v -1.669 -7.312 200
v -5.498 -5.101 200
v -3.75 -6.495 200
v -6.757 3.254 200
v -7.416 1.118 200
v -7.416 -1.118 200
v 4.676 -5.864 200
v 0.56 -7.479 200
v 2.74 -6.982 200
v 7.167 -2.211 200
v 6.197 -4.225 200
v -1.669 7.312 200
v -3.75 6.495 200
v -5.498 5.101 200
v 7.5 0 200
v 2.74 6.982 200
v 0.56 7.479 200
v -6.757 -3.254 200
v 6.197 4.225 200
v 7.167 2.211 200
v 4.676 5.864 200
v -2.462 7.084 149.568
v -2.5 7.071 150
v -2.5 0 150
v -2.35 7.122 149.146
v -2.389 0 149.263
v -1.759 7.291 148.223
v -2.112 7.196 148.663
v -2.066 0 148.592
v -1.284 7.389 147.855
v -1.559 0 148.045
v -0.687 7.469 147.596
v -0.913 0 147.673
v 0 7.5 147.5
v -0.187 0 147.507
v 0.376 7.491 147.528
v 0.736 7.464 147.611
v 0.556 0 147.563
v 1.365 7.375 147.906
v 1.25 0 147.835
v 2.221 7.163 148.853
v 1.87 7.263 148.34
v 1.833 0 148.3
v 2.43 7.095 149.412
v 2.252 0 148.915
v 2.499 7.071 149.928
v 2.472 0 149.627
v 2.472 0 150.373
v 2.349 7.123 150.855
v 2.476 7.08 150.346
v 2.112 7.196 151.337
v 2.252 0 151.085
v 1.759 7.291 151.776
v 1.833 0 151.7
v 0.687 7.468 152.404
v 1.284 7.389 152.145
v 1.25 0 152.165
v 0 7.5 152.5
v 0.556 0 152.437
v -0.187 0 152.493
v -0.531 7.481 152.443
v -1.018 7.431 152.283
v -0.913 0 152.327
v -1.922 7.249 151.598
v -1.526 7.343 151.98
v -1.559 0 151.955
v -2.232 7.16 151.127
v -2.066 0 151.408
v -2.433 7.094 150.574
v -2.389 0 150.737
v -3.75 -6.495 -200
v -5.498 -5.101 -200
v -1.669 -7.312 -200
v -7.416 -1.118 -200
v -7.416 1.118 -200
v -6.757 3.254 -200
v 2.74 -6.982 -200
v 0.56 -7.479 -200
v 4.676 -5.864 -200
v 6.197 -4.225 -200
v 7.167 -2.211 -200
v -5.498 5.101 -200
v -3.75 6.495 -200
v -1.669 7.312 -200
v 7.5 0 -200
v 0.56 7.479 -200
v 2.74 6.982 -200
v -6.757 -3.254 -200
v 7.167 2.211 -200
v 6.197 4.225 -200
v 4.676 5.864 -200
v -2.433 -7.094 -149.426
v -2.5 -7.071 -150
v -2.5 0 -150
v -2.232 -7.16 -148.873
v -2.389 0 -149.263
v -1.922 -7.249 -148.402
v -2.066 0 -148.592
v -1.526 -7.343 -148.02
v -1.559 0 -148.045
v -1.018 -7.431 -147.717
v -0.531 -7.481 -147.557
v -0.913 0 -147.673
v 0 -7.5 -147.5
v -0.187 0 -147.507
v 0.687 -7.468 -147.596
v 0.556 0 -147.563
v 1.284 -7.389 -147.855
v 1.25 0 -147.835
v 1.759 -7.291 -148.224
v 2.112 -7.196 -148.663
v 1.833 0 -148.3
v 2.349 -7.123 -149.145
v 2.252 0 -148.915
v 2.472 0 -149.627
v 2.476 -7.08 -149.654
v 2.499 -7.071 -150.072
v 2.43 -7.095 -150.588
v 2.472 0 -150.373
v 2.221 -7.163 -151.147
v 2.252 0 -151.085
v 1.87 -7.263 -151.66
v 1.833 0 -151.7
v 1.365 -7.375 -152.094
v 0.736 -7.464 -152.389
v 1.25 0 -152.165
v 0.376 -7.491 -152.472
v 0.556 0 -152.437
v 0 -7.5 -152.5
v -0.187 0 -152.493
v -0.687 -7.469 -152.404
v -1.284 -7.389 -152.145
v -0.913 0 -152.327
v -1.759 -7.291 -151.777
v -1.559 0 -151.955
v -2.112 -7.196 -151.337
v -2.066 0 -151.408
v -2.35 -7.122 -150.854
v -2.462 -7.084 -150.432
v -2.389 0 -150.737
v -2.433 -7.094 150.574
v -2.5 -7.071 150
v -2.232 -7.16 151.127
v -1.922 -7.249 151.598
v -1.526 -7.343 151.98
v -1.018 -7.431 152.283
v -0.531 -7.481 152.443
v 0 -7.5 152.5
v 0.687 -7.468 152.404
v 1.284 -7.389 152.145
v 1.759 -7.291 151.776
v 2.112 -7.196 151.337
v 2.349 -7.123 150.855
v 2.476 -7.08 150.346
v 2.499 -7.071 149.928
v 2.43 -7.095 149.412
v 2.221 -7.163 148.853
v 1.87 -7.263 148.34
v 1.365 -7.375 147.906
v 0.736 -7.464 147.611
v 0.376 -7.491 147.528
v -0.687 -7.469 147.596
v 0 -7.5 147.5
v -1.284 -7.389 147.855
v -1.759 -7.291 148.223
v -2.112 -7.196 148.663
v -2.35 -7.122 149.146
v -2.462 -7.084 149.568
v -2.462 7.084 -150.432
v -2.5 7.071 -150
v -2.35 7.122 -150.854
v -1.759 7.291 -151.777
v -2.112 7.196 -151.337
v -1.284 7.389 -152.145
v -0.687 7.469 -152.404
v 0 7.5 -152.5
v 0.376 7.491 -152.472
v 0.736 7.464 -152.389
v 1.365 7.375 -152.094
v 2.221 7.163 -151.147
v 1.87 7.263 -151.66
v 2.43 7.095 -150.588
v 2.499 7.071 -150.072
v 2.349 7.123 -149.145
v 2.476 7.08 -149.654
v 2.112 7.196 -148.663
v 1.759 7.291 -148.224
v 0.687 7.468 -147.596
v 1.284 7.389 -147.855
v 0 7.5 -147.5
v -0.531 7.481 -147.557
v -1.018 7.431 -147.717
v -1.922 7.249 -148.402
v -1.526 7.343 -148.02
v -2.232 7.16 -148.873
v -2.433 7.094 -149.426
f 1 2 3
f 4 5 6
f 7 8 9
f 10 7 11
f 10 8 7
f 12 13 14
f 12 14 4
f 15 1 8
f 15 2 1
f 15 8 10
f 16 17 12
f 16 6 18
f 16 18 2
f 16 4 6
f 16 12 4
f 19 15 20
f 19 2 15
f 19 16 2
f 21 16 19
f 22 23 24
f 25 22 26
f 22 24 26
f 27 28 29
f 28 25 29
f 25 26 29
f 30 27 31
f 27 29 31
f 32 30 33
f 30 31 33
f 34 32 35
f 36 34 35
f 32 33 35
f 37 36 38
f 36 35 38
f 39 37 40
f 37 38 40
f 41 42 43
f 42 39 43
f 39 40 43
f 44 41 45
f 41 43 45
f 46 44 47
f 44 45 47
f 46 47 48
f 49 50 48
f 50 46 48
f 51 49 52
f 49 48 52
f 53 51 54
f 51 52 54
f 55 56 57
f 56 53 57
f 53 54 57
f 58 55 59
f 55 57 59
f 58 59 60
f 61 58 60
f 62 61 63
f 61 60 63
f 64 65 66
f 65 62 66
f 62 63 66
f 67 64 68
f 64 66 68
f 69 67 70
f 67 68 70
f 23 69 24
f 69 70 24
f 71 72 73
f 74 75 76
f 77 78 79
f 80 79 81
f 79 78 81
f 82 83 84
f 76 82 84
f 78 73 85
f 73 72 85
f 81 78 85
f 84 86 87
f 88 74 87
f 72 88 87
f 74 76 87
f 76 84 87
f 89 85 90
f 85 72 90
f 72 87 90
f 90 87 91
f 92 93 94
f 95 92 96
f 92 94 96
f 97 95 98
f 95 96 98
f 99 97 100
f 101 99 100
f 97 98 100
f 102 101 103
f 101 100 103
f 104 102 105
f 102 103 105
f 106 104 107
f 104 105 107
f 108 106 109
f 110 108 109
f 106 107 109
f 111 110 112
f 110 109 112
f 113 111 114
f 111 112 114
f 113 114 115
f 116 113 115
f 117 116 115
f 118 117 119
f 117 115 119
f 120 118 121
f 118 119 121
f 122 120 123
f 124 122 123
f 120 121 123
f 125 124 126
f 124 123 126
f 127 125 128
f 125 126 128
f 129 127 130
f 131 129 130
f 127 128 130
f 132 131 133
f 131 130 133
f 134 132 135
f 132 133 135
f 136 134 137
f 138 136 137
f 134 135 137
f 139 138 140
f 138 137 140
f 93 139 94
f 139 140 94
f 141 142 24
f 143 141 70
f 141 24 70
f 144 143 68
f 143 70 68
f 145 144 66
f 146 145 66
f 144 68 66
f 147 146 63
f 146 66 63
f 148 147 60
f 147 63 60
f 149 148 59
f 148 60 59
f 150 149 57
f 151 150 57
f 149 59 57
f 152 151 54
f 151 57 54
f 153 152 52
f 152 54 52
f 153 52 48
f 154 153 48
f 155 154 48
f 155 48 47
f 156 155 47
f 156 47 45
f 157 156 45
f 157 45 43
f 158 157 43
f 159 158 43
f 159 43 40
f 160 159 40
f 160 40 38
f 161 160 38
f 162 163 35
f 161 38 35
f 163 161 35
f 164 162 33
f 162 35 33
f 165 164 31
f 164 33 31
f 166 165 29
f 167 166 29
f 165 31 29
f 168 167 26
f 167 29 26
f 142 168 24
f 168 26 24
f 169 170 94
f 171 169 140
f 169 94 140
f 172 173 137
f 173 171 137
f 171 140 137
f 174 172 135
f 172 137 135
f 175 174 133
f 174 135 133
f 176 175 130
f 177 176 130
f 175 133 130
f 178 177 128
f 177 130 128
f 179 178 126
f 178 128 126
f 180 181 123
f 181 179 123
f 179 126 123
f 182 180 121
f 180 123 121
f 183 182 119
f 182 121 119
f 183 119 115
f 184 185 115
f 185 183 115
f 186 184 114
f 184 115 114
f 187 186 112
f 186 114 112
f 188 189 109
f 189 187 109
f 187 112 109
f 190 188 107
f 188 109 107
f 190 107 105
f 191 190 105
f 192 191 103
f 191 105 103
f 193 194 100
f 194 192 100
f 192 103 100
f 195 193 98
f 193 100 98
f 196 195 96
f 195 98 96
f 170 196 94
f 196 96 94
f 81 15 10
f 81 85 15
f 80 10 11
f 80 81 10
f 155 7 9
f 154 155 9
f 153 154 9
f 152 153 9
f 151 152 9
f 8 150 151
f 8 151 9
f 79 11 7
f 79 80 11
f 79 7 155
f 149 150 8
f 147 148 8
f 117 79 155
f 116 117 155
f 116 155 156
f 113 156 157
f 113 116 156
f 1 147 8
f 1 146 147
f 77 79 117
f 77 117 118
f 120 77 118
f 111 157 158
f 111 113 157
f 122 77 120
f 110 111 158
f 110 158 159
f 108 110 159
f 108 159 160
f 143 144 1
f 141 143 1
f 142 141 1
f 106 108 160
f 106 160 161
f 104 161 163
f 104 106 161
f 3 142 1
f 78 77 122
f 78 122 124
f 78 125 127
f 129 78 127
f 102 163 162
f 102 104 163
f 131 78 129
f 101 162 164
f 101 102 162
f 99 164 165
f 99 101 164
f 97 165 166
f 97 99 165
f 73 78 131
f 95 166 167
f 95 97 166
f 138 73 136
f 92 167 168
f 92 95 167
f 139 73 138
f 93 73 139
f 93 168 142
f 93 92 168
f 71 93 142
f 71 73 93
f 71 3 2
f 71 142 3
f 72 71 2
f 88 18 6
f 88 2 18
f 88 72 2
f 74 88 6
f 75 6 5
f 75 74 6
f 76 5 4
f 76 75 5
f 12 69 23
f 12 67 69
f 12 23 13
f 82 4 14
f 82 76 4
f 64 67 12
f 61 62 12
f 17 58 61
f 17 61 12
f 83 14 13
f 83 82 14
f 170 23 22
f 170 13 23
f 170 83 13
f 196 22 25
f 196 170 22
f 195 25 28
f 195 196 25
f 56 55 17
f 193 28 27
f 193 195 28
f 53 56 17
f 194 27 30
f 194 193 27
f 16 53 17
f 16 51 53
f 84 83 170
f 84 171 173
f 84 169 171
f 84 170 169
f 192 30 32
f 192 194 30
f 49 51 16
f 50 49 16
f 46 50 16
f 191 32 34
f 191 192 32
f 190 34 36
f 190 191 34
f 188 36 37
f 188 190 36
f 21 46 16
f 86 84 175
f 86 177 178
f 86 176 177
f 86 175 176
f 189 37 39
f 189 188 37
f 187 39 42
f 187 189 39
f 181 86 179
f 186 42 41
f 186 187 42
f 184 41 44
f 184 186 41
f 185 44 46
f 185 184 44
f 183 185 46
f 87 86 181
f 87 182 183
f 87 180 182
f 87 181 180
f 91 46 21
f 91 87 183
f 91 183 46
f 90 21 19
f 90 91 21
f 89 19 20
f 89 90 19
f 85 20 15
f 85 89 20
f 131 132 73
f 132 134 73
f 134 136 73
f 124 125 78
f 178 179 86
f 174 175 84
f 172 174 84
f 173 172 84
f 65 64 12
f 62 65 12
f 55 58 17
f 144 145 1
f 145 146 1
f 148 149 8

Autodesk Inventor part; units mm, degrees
ref_plane "YZ Plane" through (0, 0, 0) normal (1, 0, 0) x (0, 1, 0)
ref_plane "XZ Plane" through (0, 0, 0) normal (0, 1, 0) x (-1, 0, 0)
ref_plane "XY Plane" through (0, 0, 0) normal (0, 0, 1) x (1, 0, 0)
sketch "Skizze1" plane through (0, 0, 0) normal (0, 0, 1) x (1, 0, 0)
  circle A0 centre (0, 0) radius 7.5
  dimension "d0" = 15
extrude "Extrusion1" add sketch "Skizze1" along normal mid plane 400
sketch "Skizze3" plane through (0, 0, 0) normal (0, 1, 0) x (-1, 0, 0)
  circle A0 centre (0, 150) radius 2.5
  circle A1 centre (0, -150) radius 2.5
  point P0 (0, 0)
  dimension "d7" = 5
  dimension "d8" = 5
extrude "Extrusion3" cut sketch "Skizze3" along normal mid plane 15
properties part number "Stange test"
